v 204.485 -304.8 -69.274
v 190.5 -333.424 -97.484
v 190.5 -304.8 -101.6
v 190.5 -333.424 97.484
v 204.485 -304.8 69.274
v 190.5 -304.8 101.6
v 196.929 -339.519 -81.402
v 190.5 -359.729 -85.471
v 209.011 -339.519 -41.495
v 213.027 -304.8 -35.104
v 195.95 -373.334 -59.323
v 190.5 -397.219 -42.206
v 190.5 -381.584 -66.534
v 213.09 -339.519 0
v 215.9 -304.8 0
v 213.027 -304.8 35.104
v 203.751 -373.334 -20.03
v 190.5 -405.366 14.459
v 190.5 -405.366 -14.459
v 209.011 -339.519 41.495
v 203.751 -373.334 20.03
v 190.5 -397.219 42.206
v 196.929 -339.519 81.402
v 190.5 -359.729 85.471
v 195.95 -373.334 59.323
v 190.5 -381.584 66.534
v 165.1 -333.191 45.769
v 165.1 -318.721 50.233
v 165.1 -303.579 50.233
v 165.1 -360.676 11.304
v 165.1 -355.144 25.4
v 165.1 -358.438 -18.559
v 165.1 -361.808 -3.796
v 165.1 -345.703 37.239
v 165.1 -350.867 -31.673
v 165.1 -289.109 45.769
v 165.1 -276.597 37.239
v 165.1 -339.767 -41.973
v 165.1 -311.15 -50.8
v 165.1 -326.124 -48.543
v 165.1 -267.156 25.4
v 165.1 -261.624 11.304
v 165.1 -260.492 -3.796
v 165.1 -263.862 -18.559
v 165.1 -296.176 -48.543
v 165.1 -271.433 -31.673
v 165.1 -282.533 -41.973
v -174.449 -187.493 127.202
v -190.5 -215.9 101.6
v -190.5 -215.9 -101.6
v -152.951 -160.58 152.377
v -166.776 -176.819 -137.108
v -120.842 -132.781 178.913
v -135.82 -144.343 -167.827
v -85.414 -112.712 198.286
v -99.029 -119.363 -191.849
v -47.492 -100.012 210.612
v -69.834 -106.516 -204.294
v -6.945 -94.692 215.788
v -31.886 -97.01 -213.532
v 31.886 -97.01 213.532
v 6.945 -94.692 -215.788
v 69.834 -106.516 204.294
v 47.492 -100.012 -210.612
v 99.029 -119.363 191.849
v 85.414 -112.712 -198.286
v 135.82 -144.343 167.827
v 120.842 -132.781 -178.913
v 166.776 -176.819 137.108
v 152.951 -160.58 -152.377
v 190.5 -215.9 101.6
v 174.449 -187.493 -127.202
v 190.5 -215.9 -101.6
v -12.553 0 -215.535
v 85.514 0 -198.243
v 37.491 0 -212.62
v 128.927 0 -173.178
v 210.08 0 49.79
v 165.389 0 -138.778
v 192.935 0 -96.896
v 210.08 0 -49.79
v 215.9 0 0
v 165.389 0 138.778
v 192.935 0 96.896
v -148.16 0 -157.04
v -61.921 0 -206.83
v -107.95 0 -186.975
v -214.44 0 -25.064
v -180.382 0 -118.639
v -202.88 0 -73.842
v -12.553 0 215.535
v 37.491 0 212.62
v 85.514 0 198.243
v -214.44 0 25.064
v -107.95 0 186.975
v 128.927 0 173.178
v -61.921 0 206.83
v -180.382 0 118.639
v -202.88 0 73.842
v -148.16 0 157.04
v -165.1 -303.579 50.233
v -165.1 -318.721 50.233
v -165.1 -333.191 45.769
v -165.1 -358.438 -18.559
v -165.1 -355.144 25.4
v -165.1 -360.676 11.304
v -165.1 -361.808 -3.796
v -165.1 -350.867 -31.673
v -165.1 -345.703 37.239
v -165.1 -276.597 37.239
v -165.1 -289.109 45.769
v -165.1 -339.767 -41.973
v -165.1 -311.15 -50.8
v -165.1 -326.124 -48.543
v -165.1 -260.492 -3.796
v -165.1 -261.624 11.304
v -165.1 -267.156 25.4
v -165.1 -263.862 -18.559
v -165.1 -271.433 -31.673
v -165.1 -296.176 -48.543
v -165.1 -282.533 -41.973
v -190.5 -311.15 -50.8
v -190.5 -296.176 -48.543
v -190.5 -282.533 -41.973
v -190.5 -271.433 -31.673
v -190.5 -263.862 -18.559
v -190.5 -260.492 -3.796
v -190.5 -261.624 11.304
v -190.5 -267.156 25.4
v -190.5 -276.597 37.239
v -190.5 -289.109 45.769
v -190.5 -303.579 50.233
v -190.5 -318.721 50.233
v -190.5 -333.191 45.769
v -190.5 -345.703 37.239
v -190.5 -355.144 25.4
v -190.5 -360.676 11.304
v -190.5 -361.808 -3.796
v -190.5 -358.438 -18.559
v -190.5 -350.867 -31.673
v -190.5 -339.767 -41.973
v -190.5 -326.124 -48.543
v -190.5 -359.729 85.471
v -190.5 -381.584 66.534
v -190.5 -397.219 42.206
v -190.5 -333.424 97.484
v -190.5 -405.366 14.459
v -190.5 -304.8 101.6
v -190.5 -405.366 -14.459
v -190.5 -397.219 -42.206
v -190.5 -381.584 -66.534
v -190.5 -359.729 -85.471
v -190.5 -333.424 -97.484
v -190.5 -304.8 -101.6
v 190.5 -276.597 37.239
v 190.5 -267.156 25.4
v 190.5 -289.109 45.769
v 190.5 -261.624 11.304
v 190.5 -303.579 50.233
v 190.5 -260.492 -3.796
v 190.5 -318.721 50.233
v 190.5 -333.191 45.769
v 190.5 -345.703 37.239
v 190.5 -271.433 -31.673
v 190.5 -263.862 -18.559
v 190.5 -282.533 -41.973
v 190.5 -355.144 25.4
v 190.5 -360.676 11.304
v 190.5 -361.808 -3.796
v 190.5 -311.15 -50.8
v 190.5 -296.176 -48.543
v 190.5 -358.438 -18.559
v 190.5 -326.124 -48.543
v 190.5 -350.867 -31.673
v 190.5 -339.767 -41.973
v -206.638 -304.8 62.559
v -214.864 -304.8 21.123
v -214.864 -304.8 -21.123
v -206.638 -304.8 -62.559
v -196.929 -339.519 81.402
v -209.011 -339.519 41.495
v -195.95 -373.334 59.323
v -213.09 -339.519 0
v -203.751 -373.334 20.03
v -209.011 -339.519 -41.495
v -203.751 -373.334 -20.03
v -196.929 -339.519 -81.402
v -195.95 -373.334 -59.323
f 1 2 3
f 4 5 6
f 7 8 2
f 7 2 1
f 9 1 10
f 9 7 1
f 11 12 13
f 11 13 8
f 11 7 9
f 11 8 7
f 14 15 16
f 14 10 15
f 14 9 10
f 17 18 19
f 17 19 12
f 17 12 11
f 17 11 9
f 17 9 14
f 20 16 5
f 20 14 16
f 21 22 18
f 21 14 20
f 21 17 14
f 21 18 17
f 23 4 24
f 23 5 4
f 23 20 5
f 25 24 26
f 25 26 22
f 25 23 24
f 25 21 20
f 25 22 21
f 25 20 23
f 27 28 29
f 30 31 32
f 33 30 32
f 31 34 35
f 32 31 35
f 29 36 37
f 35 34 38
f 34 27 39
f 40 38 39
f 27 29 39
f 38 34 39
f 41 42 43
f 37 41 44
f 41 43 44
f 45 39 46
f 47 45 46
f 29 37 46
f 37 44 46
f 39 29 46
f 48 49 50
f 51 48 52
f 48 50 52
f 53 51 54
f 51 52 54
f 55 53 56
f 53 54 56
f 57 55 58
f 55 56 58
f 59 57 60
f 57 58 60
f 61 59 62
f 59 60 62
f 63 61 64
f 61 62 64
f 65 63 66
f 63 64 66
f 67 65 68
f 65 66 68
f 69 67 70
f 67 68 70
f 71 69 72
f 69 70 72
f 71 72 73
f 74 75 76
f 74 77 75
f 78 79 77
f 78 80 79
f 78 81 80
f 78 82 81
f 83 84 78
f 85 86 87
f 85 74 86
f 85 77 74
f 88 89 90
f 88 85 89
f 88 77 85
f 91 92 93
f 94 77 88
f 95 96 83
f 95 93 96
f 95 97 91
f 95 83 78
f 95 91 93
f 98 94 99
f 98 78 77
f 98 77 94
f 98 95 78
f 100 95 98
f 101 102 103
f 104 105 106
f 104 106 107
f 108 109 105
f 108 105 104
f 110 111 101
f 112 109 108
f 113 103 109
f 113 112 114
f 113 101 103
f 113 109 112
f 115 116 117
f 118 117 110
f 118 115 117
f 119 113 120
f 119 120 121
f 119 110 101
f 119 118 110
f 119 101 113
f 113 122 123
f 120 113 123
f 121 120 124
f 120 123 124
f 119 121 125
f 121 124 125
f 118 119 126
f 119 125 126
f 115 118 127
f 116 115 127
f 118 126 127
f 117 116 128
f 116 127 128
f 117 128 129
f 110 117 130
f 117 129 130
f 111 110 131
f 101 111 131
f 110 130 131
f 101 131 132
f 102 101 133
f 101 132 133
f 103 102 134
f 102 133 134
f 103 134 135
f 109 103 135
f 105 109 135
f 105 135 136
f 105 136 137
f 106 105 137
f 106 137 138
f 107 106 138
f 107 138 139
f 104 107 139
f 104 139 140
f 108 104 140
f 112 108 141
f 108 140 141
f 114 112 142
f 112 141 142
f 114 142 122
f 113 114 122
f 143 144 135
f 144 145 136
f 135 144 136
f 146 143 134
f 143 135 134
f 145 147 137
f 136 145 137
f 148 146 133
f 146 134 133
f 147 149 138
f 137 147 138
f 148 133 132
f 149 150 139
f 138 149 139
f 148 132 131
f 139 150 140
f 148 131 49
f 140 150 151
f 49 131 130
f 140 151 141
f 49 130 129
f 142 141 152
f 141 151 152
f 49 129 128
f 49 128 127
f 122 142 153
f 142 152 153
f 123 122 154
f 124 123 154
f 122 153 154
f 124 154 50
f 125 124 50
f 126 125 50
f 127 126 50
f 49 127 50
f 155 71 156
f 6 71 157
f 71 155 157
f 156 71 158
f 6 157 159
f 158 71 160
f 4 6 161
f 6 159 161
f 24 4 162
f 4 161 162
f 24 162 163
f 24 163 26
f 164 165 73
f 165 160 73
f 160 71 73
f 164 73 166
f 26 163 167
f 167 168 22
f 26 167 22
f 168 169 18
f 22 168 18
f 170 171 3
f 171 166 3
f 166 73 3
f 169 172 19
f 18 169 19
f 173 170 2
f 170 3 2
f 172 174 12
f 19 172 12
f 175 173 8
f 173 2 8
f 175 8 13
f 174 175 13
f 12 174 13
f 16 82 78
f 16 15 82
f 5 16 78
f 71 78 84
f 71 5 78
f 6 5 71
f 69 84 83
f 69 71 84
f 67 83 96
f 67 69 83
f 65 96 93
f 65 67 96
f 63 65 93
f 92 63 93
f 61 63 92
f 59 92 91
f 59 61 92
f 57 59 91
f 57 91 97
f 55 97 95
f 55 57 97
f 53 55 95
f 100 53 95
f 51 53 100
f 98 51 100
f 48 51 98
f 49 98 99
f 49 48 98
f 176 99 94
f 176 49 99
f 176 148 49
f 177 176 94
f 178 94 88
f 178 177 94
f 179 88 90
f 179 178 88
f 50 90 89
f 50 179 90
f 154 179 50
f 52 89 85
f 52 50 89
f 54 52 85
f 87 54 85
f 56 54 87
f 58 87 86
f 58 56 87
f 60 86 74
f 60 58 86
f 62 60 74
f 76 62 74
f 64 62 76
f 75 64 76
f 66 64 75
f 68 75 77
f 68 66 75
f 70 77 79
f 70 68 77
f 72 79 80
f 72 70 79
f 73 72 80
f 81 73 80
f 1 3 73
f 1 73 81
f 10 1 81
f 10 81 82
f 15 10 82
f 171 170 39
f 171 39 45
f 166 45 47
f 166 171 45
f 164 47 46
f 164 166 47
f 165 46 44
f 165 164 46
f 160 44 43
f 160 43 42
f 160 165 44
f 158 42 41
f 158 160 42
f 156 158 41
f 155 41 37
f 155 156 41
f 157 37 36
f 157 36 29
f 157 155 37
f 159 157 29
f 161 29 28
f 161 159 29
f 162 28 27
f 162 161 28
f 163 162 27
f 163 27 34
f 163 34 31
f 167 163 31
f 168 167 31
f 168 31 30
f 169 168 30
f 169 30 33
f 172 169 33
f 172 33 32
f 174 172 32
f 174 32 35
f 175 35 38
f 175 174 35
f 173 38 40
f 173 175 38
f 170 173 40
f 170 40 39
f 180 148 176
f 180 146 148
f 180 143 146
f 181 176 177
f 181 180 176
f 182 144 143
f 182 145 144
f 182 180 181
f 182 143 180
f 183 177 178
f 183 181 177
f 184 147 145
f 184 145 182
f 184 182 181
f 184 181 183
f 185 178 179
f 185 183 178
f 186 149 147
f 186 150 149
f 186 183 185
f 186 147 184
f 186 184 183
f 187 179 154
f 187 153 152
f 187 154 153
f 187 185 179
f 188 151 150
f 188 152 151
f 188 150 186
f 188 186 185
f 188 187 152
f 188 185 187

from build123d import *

# Parameters (mm, degrees)
CUT_EXTRUDE1_DEPTH      = 216.9
CUT_EXTRUDE1_DEPTH_BACK = 216.9
SKETCH4_R               = 50.8
BOSS_EXTRUDE1_DEPTH     = 25.4


with BuildPart() as part:
    # Sketch2 → Revolve1 (revolve)
    with BuildSketch(Plane.XY):
        with BuildLine():
            Line((0, 0), (215.9, 0))
            Line((215.9, 0), (215.9, -304.8))
            ThreePointArc((215.9, -304.8), (152.664354058, -457.464354058), (0, -520.7))
            Line((0, -520.7), (0, 0))
        make_face()
    revolve(axis=Axis((0, 0, 0), (0, -1, 0)))

    # Sketch3 → Cut-Extrude1 (cut, two sides)
    with BuildSketch(Plane.XY) as cut_extrude1_sk:
        with BuildLine():
            Line((190.5, -215.9), (190.5, -546.1))
            Line((190.5, -546.1), (-190.5, -546.1))
            Line((-190.5, -546.1), (-190.5, -215.9))
            ThreePointArc((-190.5, -215.9), (0, -94.577593963), (190.5, -215.9))
        make_face()
    extrude(amount=CUT_EXTRUDE1_DEPTH, mode=Mode.SUBTRACT)
    extrude(cut_extrude1_sk.sketch, amount=-CUT_EXTRUDE1_DEPTH_BACK, mode=Mode.SUBTRACT)

    # Sketch4 → Boss-Extrude1 (add)
    with BuildSketch(Plane(origin=(-190.5, 0, 0), x_dir=(0, 0, -1), z_dir=(1, 0, 0))):
        with Locations((0, -311.15)):
            Circle(SKETCH4_R)
    boss_extrude1 = extrude(amount=BOSS_EXTRUDE1_DEPTH)

    # Mirror1: Boss-Extrude1 across plane
    add(boss_extrude1.mirror(Plane(origin=(0, 0, 0), x_dir=(0, 0, 1), z_dir=(1, 0, 0))))


solid = part.part
